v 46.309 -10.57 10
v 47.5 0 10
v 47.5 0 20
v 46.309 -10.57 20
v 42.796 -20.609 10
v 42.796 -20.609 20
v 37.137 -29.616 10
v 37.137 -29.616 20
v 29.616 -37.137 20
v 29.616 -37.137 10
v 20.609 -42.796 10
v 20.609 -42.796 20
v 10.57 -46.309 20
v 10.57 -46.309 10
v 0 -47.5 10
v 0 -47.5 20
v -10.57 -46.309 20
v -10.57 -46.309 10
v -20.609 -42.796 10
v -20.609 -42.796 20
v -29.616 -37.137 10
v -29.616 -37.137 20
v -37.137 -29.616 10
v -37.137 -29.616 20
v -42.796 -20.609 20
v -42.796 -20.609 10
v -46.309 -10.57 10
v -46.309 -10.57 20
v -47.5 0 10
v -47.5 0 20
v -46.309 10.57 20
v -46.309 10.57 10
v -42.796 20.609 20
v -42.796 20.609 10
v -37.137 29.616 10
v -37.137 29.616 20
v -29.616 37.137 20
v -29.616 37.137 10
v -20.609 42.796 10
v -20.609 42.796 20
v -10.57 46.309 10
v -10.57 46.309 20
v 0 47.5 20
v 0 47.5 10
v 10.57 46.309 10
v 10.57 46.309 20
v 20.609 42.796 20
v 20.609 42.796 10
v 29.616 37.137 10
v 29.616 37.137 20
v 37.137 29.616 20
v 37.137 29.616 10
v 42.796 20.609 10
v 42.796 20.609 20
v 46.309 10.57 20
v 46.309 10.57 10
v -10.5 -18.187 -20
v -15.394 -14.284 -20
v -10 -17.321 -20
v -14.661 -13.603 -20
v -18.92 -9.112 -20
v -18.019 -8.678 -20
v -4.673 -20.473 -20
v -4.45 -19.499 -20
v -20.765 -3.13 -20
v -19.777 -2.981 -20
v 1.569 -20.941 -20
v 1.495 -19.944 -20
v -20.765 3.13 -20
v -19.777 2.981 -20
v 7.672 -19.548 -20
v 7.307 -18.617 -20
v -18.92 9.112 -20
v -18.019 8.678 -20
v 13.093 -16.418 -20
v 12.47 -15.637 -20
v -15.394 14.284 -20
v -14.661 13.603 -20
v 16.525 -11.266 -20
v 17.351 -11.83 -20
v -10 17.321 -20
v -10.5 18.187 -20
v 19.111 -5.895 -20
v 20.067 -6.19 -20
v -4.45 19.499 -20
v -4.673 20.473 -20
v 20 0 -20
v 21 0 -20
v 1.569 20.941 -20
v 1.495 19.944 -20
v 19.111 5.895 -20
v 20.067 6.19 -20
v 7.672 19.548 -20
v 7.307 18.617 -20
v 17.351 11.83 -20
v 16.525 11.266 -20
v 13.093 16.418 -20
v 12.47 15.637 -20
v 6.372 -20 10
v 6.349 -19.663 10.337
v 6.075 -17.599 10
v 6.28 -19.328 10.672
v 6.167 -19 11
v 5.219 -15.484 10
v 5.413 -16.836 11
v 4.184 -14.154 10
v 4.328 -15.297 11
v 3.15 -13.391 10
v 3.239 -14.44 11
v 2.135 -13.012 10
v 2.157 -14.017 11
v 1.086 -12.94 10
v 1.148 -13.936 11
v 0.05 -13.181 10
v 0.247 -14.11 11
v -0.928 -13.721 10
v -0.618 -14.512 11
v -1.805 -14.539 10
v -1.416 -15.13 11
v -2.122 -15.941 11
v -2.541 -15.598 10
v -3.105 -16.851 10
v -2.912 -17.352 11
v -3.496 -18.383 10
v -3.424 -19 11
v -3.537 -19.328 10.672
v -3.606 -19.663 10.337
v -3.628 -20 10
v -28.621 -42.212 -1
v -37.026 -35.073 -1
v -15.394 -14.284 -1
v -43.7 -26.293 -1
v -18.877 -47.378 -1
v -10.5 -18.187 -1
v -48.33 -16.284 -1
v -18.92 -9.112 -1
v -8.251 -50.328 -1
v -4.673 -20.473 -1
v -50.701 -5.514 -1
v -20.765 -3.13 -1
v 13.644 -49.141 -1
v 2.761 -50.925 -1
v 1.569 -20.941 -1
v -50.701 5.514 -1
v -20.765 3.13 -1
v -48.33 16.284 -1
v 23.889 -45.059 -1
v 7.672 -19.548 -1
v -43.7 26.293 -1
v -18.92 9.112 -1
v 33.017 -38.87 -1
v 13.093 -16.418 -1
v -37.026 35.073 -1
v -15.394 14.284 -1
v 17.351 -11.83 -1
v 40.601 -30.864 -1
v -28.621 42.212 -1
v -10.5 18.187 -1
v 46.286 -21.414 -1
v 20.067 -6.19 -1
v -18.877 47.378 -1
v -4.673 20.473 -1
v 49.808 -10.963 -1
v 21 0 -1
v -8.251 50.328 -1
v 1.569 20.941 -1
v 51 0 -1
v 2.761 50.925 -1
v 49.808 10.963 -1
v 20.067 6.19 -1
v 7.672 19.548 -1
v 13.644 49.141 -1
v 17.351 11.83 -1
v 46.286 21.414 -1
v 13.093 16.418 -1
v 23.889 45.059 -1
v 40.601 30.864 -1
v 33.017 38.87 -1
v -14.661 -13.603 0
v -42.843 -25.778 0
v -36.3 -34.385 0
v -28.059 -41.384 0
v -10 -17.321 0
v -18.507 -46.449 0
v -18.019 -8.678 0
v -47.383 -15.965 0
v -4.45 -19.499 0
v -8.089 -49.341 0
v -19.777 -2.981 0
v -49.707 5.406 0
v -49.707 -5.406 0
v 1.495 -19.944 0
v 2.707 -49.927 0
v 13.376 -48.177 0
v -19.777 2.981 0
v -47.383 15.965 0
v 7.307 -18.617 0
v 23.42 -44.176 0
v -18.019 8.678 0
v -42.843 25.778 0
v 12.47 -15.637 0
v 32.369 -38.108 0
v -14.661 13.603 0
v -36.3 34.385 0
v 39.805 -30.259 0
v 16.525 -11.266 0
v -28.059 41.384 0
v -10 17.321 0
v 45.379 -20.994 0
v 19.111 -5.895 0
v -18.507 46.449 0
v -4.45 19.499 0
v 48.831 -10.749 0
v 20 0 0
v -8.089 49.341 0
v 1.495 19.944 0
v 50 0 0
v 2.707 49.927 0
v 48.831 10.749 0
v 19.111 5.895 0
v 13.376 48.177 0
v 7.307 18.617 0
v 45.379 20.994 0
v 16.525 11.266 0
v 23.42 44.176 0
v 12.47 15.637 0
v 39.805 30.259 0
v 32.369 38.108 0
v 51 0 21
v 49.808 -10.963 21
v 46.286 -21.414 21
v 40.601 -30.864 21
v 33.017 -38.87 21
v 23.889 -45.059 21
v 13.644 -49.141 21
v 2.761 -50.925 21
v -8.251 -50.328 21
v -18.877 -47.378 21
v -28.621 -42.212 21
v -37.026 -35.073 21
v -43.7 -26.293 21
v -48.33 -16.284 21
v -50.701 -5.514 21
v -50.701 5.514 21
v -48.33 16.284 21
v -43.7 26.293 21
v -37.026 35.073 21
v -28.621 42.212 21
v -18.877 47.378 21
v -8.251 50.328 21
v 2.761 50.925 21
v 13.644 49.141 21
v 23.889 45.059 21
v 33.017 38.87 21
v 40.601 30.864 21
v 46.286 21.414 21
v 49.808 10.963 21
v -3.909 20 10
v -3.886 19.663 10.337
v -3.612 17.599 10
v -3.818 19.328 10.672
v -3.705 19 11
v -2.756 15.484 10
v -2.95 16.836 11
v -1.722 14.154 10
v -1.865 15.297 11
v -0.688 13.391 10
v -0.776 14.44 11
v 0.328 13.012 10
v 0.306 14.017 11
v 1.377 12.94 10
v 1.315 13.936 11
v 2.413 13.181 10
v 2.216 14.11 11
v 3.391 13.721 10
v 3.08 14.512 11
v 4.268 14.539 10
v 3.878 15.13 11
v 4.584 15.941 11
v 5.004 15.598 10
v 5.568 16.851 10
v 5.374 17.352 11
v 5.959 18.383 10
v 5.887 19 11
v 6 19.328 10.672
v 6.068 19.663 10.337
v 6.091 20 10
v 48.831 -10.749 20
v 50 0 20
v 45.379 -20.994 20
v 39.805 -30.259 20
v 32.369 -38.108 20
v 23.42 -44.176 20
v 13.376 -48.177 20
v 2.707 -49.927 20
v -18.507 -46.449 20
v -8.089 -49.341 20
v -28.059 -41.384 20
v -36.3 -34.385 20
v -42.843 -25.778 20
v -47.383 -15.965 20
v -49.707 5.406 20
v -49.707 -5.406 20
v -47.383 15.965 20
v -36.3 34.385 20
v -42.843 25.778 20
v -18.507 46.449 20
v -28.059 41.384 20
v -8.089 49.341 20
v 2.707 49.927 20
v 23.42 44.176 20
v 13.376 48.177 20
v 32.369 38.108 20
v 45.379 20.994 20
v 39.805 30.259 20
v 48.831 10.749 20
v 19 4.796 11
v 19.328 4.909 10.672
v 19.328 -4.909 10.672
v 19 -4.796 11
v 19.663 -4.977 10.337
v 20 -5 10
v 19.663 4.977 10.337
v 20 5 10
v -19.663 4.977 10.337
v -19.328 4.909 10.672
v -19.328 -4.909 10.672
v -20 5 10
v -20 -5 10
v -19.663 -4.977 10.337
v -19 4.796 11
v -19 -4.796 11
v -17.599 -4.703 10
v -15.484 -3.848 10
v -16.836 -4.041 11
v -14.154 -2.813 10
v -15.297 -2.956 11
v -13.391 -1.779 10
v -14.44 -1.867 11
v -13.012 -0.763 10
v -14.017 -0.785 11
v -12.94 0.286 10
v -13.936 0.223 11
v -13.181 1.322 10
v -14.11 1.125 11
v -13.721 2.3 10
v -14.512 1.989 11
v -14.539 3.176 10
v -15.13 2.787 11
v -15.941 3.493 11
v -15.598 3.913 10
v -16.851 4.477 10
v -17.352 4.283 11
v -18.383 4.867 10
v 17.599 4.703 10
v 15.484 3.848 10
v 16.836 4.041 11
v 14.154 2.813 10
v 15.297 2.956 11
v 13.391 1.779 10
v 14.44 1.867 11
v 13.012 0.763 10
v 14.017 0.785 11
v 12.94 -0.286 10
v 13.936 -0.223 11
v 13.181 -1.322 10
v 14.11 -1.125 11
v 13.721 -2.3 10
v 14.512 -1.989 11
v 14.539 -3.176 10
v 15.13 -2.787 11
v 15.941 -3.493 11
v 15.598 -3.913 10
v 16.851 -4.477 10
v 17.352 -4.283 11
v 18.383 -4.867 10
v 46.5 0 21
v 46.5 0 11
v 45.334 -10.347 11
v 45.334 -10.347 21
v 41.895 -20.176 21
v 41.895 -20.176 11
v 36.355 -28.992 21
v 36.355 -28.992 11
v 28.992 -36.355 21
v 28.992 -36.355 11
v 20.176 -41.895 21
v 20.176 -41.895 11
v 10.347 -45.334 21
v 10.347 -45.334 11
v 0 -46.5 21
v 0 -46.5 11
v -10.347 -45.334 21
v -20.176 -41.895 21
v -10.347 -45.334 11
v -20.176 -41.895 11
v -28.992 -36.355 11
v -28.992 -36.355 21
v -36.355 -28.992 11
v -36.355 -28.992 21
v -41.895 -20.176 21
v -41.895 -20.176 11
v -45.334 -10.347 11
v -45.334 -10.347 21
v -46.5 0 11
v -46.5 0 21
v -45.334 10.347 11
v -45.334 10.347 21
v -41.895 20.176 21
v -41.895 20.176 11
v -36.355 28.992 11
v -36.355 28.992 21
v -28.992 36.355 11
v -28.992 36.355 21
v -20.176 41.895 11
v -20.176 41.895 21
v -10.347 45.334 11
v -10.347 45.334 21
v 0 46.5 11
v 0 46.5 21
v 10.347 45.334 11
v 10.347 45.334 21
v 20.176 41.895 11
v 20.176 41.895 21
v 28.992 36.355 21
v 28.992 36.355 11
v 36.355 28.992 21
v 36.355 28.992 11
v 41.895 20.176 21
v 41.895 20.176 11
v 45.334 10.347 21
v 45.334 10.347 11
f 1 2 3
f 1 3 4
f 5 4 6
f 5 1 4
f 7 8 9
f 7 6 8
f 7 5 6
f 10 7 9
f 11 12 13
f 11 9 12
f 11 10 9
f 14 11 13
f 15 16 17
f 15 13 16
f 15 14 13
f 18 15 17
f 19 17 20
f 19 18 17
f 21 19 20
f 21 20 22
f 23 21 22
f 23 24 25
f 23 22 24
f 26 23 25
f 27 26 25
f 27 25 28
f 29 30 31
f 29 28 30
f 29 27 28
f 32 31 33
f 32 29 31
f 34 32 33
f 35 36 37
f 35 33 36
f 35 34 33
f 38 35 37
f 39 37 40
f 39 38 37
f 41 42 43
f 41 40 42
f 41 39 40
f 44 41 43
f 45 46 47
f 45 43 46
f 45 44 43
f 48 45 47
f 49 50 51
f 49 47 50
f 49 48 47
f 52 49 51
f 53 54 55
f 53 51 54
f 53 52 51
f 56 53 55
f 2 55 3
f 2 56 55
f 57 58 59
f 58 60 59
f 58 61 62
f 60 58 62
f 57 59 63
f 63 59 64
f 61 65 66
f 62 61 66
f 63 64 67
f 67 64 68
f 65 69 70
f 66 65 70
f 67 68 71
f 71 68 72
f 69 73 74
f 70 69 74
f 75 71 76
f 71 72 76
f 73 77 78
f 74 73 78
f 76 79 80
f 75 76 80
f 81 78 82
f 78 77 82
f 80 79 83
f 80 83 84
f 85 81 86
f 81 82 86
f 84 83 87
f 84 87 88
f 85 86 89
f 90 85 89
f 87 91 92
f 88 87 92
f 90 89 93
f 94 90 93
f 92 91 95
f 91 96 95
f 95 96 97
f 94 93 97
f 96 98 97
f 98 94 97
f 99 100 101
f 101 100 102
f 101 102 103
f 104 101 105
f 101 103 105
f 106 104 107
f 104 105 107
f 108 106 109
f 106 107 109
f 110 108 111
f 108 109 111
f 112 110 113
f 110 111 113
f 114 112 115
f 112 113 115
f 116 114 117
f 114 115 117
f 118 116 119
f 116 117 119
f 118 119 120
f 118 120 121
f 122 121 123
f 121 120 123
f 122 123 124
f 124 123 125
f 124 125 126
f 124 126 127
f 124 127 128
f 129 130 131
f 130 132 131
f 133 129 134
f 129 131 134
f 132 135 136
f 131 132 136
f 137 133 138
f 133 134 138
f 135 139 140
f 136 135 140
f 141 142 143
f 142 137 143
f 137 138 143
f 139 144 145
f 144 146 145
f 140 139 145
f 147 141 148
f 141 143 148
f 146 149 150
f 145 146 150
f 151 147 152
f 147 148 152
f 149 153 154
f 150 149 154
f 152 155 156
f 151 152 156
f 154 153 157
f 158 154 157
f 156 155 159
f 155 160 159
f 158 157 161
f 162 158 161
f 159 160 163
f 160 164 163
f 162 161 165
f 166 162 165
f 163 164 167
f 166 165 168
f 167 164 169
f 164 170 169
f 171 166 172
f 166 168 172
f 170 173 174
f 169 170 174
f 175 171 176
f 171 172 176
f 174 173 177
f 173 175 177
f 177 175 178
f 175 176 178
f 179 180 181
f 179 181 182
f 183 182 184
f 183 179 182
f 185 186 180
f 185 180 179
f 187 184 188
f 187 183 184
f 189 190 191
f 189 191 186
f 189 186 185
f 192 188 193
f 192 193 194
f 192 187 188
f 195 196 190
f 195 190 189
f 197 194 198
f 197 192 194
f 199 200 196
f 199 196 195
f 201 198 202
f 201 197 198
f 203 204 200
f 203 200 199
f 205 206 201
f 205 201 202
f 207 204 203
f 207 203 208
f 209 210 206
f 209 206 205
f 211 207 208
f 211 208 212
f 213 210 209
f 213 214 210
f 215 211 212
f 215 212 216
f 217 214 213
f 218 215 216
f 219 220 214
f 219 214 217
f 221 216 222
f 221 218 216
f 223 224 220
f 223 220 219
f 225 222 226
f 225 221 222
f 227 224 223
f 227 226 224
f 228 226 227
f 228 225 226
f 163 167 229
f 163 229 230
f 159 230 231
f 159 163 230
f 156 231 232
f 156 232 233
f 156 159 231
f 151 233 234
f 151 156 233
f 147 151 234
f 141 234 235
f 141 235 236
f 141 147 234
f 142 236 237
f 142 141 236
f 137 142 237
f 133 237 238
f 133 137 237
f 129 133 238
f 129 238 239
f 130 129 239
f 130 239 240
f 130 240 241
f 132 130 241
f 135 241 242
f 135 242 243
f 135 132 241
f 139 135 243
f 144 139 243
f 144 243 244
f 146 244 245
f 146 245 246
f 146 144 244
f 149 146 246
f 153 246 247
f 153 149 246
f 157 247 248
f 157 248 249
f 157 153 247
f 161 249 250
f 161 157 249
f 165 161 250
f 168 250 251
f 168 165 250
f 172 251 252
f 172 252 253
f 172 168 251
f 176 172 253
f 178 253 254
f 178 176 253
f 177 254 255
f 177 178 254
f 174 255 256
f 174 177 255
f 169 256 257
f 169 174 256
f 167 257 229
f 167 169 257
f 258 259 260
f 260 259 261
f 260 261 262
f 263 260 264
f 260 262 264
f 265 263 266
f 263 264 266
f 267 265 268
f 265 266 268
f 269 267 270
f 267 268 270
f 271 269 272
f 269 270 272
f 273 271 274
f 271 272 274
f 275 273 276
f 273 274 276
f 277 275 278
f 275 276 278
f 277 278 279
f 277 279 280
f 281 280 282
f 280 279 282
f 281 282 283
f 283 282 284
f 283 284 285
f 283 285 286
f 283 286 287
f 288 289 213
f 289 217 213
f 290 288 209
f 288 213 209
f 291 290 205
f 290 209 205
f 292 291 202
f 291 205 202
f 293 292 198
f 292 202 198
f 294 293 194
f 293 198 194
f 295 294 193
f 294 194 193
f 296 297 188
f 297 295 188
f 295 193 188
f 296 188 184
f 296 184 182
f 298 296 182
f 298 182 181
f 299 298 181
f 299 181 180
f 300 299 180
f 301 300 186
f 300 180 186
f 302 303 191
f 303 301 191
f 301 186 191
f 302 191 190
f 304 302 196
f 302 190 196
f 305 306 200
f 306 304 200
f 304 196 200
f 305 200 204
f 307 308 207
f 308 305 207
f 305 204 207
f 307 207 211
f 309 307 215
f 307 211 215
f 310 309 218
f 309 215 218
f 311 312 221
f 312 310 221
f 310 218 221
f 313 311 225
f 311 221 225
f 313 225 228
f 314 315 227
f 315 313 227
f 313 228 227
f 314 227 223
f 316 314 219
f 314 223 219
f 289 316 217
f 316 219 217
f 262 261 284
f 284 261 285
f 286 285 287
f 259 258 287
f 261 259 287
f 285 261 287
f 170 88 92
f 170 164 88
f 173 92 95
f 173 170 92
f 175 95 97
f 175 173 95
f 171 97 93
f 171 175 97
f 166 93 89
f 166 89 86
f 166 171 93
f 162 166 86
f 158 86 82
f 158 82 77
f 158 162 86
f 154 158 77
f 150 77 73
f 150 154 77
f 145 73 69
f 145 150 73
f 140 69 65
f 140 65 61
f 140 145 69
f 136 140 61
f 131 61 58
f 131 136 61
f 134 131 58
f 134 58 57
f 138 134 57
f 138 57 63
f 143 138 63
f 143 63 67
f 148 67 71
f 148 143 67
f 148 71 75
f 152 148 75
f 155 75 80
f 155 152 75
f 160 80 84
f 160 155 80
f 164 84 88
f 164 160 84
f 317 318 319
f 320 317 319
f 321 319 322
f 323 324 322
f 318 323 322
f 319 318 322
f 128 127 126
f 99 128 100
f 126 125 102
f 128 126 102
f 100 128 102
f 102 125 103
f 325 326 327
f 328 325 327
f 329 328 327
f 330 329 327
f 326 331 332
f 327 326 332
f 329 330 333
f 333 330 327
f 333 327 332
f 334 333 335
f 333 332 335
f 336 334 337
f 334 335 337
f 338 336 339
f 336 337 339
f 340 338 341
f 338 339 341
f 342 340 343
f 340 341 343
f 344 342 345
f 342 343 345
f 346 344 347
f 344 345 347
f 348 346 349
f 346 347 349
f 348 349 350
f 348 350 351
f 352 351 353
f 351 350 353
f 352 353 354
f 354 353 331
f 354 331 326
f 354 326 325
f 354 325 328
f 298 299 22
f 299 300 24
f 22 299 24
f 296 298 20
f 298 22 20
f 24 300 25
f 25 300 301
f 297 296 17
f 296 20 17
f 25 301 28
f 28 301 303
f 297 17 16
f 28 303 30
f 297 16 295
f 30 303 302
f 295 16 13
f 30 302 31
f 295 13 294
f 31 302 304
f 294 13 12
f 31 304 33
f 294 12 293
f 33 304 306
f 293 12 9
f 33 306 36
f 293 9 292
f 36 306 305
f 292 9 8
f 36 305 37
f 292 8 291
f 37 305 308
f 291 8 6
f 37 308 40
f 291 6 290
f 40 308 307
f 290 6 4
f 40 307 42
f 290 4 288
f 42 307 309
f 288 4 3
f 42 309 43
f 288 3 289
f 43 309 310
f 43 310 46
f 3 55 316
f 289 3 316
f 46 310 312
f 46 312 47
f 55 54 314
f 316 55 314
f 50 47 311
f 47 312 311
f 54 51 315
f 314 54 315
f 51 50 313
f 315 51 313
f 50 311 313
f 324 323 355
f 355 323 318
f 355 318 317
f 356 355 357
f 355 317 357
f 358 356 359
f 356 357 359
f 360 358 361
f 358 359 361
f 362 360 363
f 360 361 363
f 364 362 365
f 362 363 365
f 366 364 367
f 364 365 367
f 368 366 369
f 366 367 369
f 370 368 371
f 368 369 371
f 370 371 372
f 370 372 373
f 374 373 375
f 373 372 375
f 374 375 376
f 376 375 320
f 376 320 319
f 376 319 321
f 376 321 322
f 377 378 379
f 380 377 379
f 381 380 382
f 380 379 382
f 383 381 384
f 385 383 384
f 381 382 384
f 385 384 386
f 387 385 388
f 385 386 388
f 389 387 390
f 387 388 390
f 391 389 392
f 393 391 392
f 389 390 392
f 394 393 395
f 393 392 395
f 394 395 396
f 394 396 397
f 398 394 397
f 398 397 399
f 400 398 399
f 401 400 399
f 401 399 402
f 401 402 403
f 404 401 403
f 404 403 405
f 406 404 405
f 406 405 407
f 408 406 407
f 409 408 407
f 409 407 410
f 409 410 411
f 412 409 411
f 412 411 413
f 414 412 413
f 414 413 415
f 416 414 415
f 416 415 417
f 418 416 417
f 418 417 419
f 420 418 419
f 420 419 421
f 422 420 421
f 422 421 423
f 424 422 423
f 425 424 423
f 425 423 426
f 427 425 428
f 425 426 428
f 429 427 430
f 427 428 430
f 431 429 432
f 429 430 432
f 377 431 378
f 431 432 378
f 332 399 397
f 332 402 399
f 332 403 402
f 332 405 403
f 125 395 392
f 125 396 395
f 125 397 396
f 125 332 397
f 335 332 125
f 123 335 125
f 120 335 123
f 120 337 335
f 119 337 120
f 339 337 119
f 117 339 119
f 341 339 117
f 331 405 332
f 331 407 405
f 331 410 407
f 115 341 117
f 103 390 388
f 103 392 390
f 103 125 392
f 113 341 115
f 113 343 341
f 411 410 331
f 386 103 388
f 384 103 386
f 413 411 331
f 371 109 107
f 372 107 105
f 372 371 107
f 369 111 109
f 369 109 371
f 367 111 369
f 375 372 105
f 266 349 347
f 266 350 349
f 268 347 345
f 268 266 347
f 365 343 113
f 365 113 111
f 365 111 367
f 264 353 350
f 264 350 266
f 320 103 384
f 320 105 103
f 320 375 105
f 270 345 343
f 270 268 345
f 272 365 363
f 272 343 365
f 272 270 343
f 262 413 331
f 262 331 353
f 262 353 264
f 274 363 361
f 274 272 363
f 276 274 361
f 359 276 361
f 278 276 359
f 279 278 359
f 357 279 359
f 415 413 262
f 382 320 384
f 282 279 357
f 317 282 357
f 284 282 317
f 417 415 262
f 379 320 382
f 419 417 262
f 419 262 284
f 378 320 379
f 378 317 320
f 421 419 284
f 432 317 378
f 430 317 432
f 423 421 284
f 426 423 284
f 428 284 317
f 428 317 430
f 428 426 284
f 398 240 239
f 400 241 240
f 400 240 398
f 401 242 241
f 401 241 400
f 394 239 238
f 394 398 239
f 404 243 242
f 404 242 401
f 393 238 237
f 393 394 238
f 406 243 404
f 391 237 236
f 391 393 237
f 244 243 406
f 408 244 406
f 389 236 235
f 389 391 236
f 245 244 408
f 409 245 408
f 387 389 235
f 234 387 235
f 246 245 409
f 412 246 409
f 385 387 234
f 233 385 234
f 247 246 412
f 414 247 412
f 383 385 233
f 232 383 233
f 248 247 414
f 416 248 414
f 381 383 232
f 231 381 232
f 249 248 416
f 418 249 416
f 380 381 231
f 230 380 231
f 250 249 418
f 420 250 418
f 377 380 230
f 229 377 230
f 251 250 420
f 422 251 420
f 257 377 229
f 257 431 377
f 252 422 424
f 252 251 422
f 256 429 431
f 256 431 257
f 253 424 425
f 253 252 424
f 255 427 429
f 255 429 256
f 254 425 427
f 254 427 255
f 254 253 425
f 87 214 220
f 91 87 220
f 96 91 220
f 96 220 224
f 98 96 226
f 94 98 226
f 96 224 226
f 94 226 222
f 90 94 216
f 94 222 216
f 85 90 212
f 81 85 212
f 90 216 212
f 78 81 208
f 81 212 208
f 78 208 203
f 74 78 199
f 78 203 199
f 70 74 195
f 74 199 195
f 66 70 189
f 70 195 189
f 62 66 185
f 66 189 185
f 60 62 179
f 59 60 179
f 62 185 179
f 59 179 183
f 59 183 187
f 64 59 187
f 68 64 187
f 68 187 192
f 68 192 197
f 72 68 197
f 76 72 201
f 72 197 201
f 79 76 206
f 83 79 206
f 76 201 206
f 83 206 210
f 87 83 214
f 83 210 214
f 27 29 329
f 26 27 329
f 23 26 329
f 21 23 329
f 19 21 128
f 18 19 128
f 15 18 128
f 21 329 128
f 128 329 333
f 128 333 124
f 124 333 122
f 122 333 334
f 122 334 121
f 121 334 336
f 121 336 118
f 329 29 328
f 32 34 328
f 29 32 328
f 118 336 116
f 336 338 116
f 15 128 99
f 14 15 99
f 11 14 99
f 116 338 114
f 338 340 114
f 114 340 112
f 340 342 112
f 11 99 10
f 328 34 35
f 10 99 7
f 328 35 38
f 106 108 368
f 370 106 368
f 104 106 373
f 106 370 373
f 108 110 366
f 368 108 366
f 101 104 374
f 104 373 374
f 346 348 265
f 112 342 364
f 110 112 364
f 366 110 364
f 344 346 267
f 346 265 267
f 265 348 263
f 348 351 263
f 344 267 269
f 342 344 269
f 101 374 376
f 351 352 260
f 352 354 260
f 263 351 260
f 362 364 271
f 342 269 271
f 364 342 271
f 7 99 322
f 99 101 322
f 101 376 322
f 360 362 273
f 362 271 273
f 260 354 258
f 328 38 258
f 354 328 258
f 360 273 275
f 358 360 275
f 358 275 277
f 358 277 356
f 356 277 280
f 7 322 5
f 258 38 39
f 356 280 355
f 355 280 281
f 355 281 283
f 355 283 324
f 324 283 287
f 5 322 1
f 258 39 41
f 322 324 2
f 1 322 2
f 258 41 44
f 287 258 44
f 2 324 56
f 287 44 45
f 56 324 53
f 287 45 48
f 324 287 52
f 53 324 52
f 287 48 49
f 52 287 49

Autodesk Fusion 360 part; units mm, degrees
sketch "Sketch1" plane through (0, 0, 0) normal (0, 0, 1) x (1, 0, 0)
  circle A0 centre (0, 0) radius 50
extrude "Extrude1" add sketch "Sketch1" along normal blind 20
ref_plane "WorkPlane1" through (0, 0, 10) normal (0, 0, 1) x (1, 0, 0)
sketch "Sketch2" plane through (0, 0, 10) normal (0, 0, 1) x (1, 0, 0)
  circle A0 centre (0, 0) radius 47.5
extrude "Extrude2" cut sketch "Sketch2" along normal blind 10
sketch "Sketch3" plane through (0, 0, 0) normal (0, 0, 1) x (1, 0, 0)
  circle A0 centre (0, 0) radius 20
extrude "Extrude3" add sketch "Sketch3" against normal blind 20
sketch "Sketch4" plane through (0, 0, -20) normal (0, 0, -1) x (1, 0, 0)
  circle A0 centre (0, 0) radius 20
shell "Shell1" thickness 1 outward yes removed faces 1 at (6.3705, -1.965, -20)
sketch "Sketch5" plane through (0, 0, 10) normal (0, 0, 1) x (1, 0, 0)
  line L0 (0, 0) -> (20, 0)
  line L1 (0, 0) -> (0, 20)
  line L2 (0, 0) -> (-20, 0)
  line L3 (0, 0) -> (0, -20)
  line L4 (-10, 20) -> (12.1822, 20)
  line L5 (-10, -20) -> (12.7429, -20)
  line L6 (-20, 10) -> (-20, -10)
  line L7 (20, 10) -> (20, -10)
ref_plane "WorkPlane2" through (-20, 0, 10) normal (-0.7071, 0, 0.7071) x (0, -1, 0)
sketch "Sketch6" plane through (-20, 0, 10) normal (-0.7071, 0, 0.7071) x (0, -1, 0)
  circle A0 centre (0, 0) radius 5
  dimension "d17" = 10
extrude "Extrude4" cut sketch "Sketch6" against normal blind 10
ref_plane "WorkPlane3" through (1.3715, -20, 10) normal (0, -0.7071, 0.7071) x (1, 0, 0)
sketch "Sketch7" plane through (0, 0, 10) normal (0, 0, 1) x (1, 0, 0)
sketch "Sketch8" plane through (1.3715, -20, 10) normal (0, -0.7071, 0.7071) x (1, 0, 0)
  circle A0 centre (0, 0) radius 5
  dimension "d21" = 10
extrude "Extrude5" cut sketch "Sketch8" against normal blind 30
ref_plane "WorkPlane4" through (20, 0, 10) normal (0.7071, 0, 0.7071) x (0, -1, 0)
sketch "Sketch9" plane through (20, 0, 10) normal (0.7071, 0, 0.7071) x (0, -1, 0)
  circle A0 centre (0, 0) radius 5
  dimension "d25" = 10
ref_plane "WorkPlane5" through (1.0911, 20, 10) normal (0, 0.7071, 0.7071) x (1, 0, 0)
sketch "Sketch10" plane through (1.0911, 20, 10) normal (0, 0.7071, 0.7071) x (1, 0, 0)
  circle A0 centre (0, 0) radius 5
  dimension "d27" = 10
extrude "Extrude6" cut sketch "Sketch9" against normal blind 20
extrude "Extrude7" cut sketch "Sketch10" against normal blind 10
